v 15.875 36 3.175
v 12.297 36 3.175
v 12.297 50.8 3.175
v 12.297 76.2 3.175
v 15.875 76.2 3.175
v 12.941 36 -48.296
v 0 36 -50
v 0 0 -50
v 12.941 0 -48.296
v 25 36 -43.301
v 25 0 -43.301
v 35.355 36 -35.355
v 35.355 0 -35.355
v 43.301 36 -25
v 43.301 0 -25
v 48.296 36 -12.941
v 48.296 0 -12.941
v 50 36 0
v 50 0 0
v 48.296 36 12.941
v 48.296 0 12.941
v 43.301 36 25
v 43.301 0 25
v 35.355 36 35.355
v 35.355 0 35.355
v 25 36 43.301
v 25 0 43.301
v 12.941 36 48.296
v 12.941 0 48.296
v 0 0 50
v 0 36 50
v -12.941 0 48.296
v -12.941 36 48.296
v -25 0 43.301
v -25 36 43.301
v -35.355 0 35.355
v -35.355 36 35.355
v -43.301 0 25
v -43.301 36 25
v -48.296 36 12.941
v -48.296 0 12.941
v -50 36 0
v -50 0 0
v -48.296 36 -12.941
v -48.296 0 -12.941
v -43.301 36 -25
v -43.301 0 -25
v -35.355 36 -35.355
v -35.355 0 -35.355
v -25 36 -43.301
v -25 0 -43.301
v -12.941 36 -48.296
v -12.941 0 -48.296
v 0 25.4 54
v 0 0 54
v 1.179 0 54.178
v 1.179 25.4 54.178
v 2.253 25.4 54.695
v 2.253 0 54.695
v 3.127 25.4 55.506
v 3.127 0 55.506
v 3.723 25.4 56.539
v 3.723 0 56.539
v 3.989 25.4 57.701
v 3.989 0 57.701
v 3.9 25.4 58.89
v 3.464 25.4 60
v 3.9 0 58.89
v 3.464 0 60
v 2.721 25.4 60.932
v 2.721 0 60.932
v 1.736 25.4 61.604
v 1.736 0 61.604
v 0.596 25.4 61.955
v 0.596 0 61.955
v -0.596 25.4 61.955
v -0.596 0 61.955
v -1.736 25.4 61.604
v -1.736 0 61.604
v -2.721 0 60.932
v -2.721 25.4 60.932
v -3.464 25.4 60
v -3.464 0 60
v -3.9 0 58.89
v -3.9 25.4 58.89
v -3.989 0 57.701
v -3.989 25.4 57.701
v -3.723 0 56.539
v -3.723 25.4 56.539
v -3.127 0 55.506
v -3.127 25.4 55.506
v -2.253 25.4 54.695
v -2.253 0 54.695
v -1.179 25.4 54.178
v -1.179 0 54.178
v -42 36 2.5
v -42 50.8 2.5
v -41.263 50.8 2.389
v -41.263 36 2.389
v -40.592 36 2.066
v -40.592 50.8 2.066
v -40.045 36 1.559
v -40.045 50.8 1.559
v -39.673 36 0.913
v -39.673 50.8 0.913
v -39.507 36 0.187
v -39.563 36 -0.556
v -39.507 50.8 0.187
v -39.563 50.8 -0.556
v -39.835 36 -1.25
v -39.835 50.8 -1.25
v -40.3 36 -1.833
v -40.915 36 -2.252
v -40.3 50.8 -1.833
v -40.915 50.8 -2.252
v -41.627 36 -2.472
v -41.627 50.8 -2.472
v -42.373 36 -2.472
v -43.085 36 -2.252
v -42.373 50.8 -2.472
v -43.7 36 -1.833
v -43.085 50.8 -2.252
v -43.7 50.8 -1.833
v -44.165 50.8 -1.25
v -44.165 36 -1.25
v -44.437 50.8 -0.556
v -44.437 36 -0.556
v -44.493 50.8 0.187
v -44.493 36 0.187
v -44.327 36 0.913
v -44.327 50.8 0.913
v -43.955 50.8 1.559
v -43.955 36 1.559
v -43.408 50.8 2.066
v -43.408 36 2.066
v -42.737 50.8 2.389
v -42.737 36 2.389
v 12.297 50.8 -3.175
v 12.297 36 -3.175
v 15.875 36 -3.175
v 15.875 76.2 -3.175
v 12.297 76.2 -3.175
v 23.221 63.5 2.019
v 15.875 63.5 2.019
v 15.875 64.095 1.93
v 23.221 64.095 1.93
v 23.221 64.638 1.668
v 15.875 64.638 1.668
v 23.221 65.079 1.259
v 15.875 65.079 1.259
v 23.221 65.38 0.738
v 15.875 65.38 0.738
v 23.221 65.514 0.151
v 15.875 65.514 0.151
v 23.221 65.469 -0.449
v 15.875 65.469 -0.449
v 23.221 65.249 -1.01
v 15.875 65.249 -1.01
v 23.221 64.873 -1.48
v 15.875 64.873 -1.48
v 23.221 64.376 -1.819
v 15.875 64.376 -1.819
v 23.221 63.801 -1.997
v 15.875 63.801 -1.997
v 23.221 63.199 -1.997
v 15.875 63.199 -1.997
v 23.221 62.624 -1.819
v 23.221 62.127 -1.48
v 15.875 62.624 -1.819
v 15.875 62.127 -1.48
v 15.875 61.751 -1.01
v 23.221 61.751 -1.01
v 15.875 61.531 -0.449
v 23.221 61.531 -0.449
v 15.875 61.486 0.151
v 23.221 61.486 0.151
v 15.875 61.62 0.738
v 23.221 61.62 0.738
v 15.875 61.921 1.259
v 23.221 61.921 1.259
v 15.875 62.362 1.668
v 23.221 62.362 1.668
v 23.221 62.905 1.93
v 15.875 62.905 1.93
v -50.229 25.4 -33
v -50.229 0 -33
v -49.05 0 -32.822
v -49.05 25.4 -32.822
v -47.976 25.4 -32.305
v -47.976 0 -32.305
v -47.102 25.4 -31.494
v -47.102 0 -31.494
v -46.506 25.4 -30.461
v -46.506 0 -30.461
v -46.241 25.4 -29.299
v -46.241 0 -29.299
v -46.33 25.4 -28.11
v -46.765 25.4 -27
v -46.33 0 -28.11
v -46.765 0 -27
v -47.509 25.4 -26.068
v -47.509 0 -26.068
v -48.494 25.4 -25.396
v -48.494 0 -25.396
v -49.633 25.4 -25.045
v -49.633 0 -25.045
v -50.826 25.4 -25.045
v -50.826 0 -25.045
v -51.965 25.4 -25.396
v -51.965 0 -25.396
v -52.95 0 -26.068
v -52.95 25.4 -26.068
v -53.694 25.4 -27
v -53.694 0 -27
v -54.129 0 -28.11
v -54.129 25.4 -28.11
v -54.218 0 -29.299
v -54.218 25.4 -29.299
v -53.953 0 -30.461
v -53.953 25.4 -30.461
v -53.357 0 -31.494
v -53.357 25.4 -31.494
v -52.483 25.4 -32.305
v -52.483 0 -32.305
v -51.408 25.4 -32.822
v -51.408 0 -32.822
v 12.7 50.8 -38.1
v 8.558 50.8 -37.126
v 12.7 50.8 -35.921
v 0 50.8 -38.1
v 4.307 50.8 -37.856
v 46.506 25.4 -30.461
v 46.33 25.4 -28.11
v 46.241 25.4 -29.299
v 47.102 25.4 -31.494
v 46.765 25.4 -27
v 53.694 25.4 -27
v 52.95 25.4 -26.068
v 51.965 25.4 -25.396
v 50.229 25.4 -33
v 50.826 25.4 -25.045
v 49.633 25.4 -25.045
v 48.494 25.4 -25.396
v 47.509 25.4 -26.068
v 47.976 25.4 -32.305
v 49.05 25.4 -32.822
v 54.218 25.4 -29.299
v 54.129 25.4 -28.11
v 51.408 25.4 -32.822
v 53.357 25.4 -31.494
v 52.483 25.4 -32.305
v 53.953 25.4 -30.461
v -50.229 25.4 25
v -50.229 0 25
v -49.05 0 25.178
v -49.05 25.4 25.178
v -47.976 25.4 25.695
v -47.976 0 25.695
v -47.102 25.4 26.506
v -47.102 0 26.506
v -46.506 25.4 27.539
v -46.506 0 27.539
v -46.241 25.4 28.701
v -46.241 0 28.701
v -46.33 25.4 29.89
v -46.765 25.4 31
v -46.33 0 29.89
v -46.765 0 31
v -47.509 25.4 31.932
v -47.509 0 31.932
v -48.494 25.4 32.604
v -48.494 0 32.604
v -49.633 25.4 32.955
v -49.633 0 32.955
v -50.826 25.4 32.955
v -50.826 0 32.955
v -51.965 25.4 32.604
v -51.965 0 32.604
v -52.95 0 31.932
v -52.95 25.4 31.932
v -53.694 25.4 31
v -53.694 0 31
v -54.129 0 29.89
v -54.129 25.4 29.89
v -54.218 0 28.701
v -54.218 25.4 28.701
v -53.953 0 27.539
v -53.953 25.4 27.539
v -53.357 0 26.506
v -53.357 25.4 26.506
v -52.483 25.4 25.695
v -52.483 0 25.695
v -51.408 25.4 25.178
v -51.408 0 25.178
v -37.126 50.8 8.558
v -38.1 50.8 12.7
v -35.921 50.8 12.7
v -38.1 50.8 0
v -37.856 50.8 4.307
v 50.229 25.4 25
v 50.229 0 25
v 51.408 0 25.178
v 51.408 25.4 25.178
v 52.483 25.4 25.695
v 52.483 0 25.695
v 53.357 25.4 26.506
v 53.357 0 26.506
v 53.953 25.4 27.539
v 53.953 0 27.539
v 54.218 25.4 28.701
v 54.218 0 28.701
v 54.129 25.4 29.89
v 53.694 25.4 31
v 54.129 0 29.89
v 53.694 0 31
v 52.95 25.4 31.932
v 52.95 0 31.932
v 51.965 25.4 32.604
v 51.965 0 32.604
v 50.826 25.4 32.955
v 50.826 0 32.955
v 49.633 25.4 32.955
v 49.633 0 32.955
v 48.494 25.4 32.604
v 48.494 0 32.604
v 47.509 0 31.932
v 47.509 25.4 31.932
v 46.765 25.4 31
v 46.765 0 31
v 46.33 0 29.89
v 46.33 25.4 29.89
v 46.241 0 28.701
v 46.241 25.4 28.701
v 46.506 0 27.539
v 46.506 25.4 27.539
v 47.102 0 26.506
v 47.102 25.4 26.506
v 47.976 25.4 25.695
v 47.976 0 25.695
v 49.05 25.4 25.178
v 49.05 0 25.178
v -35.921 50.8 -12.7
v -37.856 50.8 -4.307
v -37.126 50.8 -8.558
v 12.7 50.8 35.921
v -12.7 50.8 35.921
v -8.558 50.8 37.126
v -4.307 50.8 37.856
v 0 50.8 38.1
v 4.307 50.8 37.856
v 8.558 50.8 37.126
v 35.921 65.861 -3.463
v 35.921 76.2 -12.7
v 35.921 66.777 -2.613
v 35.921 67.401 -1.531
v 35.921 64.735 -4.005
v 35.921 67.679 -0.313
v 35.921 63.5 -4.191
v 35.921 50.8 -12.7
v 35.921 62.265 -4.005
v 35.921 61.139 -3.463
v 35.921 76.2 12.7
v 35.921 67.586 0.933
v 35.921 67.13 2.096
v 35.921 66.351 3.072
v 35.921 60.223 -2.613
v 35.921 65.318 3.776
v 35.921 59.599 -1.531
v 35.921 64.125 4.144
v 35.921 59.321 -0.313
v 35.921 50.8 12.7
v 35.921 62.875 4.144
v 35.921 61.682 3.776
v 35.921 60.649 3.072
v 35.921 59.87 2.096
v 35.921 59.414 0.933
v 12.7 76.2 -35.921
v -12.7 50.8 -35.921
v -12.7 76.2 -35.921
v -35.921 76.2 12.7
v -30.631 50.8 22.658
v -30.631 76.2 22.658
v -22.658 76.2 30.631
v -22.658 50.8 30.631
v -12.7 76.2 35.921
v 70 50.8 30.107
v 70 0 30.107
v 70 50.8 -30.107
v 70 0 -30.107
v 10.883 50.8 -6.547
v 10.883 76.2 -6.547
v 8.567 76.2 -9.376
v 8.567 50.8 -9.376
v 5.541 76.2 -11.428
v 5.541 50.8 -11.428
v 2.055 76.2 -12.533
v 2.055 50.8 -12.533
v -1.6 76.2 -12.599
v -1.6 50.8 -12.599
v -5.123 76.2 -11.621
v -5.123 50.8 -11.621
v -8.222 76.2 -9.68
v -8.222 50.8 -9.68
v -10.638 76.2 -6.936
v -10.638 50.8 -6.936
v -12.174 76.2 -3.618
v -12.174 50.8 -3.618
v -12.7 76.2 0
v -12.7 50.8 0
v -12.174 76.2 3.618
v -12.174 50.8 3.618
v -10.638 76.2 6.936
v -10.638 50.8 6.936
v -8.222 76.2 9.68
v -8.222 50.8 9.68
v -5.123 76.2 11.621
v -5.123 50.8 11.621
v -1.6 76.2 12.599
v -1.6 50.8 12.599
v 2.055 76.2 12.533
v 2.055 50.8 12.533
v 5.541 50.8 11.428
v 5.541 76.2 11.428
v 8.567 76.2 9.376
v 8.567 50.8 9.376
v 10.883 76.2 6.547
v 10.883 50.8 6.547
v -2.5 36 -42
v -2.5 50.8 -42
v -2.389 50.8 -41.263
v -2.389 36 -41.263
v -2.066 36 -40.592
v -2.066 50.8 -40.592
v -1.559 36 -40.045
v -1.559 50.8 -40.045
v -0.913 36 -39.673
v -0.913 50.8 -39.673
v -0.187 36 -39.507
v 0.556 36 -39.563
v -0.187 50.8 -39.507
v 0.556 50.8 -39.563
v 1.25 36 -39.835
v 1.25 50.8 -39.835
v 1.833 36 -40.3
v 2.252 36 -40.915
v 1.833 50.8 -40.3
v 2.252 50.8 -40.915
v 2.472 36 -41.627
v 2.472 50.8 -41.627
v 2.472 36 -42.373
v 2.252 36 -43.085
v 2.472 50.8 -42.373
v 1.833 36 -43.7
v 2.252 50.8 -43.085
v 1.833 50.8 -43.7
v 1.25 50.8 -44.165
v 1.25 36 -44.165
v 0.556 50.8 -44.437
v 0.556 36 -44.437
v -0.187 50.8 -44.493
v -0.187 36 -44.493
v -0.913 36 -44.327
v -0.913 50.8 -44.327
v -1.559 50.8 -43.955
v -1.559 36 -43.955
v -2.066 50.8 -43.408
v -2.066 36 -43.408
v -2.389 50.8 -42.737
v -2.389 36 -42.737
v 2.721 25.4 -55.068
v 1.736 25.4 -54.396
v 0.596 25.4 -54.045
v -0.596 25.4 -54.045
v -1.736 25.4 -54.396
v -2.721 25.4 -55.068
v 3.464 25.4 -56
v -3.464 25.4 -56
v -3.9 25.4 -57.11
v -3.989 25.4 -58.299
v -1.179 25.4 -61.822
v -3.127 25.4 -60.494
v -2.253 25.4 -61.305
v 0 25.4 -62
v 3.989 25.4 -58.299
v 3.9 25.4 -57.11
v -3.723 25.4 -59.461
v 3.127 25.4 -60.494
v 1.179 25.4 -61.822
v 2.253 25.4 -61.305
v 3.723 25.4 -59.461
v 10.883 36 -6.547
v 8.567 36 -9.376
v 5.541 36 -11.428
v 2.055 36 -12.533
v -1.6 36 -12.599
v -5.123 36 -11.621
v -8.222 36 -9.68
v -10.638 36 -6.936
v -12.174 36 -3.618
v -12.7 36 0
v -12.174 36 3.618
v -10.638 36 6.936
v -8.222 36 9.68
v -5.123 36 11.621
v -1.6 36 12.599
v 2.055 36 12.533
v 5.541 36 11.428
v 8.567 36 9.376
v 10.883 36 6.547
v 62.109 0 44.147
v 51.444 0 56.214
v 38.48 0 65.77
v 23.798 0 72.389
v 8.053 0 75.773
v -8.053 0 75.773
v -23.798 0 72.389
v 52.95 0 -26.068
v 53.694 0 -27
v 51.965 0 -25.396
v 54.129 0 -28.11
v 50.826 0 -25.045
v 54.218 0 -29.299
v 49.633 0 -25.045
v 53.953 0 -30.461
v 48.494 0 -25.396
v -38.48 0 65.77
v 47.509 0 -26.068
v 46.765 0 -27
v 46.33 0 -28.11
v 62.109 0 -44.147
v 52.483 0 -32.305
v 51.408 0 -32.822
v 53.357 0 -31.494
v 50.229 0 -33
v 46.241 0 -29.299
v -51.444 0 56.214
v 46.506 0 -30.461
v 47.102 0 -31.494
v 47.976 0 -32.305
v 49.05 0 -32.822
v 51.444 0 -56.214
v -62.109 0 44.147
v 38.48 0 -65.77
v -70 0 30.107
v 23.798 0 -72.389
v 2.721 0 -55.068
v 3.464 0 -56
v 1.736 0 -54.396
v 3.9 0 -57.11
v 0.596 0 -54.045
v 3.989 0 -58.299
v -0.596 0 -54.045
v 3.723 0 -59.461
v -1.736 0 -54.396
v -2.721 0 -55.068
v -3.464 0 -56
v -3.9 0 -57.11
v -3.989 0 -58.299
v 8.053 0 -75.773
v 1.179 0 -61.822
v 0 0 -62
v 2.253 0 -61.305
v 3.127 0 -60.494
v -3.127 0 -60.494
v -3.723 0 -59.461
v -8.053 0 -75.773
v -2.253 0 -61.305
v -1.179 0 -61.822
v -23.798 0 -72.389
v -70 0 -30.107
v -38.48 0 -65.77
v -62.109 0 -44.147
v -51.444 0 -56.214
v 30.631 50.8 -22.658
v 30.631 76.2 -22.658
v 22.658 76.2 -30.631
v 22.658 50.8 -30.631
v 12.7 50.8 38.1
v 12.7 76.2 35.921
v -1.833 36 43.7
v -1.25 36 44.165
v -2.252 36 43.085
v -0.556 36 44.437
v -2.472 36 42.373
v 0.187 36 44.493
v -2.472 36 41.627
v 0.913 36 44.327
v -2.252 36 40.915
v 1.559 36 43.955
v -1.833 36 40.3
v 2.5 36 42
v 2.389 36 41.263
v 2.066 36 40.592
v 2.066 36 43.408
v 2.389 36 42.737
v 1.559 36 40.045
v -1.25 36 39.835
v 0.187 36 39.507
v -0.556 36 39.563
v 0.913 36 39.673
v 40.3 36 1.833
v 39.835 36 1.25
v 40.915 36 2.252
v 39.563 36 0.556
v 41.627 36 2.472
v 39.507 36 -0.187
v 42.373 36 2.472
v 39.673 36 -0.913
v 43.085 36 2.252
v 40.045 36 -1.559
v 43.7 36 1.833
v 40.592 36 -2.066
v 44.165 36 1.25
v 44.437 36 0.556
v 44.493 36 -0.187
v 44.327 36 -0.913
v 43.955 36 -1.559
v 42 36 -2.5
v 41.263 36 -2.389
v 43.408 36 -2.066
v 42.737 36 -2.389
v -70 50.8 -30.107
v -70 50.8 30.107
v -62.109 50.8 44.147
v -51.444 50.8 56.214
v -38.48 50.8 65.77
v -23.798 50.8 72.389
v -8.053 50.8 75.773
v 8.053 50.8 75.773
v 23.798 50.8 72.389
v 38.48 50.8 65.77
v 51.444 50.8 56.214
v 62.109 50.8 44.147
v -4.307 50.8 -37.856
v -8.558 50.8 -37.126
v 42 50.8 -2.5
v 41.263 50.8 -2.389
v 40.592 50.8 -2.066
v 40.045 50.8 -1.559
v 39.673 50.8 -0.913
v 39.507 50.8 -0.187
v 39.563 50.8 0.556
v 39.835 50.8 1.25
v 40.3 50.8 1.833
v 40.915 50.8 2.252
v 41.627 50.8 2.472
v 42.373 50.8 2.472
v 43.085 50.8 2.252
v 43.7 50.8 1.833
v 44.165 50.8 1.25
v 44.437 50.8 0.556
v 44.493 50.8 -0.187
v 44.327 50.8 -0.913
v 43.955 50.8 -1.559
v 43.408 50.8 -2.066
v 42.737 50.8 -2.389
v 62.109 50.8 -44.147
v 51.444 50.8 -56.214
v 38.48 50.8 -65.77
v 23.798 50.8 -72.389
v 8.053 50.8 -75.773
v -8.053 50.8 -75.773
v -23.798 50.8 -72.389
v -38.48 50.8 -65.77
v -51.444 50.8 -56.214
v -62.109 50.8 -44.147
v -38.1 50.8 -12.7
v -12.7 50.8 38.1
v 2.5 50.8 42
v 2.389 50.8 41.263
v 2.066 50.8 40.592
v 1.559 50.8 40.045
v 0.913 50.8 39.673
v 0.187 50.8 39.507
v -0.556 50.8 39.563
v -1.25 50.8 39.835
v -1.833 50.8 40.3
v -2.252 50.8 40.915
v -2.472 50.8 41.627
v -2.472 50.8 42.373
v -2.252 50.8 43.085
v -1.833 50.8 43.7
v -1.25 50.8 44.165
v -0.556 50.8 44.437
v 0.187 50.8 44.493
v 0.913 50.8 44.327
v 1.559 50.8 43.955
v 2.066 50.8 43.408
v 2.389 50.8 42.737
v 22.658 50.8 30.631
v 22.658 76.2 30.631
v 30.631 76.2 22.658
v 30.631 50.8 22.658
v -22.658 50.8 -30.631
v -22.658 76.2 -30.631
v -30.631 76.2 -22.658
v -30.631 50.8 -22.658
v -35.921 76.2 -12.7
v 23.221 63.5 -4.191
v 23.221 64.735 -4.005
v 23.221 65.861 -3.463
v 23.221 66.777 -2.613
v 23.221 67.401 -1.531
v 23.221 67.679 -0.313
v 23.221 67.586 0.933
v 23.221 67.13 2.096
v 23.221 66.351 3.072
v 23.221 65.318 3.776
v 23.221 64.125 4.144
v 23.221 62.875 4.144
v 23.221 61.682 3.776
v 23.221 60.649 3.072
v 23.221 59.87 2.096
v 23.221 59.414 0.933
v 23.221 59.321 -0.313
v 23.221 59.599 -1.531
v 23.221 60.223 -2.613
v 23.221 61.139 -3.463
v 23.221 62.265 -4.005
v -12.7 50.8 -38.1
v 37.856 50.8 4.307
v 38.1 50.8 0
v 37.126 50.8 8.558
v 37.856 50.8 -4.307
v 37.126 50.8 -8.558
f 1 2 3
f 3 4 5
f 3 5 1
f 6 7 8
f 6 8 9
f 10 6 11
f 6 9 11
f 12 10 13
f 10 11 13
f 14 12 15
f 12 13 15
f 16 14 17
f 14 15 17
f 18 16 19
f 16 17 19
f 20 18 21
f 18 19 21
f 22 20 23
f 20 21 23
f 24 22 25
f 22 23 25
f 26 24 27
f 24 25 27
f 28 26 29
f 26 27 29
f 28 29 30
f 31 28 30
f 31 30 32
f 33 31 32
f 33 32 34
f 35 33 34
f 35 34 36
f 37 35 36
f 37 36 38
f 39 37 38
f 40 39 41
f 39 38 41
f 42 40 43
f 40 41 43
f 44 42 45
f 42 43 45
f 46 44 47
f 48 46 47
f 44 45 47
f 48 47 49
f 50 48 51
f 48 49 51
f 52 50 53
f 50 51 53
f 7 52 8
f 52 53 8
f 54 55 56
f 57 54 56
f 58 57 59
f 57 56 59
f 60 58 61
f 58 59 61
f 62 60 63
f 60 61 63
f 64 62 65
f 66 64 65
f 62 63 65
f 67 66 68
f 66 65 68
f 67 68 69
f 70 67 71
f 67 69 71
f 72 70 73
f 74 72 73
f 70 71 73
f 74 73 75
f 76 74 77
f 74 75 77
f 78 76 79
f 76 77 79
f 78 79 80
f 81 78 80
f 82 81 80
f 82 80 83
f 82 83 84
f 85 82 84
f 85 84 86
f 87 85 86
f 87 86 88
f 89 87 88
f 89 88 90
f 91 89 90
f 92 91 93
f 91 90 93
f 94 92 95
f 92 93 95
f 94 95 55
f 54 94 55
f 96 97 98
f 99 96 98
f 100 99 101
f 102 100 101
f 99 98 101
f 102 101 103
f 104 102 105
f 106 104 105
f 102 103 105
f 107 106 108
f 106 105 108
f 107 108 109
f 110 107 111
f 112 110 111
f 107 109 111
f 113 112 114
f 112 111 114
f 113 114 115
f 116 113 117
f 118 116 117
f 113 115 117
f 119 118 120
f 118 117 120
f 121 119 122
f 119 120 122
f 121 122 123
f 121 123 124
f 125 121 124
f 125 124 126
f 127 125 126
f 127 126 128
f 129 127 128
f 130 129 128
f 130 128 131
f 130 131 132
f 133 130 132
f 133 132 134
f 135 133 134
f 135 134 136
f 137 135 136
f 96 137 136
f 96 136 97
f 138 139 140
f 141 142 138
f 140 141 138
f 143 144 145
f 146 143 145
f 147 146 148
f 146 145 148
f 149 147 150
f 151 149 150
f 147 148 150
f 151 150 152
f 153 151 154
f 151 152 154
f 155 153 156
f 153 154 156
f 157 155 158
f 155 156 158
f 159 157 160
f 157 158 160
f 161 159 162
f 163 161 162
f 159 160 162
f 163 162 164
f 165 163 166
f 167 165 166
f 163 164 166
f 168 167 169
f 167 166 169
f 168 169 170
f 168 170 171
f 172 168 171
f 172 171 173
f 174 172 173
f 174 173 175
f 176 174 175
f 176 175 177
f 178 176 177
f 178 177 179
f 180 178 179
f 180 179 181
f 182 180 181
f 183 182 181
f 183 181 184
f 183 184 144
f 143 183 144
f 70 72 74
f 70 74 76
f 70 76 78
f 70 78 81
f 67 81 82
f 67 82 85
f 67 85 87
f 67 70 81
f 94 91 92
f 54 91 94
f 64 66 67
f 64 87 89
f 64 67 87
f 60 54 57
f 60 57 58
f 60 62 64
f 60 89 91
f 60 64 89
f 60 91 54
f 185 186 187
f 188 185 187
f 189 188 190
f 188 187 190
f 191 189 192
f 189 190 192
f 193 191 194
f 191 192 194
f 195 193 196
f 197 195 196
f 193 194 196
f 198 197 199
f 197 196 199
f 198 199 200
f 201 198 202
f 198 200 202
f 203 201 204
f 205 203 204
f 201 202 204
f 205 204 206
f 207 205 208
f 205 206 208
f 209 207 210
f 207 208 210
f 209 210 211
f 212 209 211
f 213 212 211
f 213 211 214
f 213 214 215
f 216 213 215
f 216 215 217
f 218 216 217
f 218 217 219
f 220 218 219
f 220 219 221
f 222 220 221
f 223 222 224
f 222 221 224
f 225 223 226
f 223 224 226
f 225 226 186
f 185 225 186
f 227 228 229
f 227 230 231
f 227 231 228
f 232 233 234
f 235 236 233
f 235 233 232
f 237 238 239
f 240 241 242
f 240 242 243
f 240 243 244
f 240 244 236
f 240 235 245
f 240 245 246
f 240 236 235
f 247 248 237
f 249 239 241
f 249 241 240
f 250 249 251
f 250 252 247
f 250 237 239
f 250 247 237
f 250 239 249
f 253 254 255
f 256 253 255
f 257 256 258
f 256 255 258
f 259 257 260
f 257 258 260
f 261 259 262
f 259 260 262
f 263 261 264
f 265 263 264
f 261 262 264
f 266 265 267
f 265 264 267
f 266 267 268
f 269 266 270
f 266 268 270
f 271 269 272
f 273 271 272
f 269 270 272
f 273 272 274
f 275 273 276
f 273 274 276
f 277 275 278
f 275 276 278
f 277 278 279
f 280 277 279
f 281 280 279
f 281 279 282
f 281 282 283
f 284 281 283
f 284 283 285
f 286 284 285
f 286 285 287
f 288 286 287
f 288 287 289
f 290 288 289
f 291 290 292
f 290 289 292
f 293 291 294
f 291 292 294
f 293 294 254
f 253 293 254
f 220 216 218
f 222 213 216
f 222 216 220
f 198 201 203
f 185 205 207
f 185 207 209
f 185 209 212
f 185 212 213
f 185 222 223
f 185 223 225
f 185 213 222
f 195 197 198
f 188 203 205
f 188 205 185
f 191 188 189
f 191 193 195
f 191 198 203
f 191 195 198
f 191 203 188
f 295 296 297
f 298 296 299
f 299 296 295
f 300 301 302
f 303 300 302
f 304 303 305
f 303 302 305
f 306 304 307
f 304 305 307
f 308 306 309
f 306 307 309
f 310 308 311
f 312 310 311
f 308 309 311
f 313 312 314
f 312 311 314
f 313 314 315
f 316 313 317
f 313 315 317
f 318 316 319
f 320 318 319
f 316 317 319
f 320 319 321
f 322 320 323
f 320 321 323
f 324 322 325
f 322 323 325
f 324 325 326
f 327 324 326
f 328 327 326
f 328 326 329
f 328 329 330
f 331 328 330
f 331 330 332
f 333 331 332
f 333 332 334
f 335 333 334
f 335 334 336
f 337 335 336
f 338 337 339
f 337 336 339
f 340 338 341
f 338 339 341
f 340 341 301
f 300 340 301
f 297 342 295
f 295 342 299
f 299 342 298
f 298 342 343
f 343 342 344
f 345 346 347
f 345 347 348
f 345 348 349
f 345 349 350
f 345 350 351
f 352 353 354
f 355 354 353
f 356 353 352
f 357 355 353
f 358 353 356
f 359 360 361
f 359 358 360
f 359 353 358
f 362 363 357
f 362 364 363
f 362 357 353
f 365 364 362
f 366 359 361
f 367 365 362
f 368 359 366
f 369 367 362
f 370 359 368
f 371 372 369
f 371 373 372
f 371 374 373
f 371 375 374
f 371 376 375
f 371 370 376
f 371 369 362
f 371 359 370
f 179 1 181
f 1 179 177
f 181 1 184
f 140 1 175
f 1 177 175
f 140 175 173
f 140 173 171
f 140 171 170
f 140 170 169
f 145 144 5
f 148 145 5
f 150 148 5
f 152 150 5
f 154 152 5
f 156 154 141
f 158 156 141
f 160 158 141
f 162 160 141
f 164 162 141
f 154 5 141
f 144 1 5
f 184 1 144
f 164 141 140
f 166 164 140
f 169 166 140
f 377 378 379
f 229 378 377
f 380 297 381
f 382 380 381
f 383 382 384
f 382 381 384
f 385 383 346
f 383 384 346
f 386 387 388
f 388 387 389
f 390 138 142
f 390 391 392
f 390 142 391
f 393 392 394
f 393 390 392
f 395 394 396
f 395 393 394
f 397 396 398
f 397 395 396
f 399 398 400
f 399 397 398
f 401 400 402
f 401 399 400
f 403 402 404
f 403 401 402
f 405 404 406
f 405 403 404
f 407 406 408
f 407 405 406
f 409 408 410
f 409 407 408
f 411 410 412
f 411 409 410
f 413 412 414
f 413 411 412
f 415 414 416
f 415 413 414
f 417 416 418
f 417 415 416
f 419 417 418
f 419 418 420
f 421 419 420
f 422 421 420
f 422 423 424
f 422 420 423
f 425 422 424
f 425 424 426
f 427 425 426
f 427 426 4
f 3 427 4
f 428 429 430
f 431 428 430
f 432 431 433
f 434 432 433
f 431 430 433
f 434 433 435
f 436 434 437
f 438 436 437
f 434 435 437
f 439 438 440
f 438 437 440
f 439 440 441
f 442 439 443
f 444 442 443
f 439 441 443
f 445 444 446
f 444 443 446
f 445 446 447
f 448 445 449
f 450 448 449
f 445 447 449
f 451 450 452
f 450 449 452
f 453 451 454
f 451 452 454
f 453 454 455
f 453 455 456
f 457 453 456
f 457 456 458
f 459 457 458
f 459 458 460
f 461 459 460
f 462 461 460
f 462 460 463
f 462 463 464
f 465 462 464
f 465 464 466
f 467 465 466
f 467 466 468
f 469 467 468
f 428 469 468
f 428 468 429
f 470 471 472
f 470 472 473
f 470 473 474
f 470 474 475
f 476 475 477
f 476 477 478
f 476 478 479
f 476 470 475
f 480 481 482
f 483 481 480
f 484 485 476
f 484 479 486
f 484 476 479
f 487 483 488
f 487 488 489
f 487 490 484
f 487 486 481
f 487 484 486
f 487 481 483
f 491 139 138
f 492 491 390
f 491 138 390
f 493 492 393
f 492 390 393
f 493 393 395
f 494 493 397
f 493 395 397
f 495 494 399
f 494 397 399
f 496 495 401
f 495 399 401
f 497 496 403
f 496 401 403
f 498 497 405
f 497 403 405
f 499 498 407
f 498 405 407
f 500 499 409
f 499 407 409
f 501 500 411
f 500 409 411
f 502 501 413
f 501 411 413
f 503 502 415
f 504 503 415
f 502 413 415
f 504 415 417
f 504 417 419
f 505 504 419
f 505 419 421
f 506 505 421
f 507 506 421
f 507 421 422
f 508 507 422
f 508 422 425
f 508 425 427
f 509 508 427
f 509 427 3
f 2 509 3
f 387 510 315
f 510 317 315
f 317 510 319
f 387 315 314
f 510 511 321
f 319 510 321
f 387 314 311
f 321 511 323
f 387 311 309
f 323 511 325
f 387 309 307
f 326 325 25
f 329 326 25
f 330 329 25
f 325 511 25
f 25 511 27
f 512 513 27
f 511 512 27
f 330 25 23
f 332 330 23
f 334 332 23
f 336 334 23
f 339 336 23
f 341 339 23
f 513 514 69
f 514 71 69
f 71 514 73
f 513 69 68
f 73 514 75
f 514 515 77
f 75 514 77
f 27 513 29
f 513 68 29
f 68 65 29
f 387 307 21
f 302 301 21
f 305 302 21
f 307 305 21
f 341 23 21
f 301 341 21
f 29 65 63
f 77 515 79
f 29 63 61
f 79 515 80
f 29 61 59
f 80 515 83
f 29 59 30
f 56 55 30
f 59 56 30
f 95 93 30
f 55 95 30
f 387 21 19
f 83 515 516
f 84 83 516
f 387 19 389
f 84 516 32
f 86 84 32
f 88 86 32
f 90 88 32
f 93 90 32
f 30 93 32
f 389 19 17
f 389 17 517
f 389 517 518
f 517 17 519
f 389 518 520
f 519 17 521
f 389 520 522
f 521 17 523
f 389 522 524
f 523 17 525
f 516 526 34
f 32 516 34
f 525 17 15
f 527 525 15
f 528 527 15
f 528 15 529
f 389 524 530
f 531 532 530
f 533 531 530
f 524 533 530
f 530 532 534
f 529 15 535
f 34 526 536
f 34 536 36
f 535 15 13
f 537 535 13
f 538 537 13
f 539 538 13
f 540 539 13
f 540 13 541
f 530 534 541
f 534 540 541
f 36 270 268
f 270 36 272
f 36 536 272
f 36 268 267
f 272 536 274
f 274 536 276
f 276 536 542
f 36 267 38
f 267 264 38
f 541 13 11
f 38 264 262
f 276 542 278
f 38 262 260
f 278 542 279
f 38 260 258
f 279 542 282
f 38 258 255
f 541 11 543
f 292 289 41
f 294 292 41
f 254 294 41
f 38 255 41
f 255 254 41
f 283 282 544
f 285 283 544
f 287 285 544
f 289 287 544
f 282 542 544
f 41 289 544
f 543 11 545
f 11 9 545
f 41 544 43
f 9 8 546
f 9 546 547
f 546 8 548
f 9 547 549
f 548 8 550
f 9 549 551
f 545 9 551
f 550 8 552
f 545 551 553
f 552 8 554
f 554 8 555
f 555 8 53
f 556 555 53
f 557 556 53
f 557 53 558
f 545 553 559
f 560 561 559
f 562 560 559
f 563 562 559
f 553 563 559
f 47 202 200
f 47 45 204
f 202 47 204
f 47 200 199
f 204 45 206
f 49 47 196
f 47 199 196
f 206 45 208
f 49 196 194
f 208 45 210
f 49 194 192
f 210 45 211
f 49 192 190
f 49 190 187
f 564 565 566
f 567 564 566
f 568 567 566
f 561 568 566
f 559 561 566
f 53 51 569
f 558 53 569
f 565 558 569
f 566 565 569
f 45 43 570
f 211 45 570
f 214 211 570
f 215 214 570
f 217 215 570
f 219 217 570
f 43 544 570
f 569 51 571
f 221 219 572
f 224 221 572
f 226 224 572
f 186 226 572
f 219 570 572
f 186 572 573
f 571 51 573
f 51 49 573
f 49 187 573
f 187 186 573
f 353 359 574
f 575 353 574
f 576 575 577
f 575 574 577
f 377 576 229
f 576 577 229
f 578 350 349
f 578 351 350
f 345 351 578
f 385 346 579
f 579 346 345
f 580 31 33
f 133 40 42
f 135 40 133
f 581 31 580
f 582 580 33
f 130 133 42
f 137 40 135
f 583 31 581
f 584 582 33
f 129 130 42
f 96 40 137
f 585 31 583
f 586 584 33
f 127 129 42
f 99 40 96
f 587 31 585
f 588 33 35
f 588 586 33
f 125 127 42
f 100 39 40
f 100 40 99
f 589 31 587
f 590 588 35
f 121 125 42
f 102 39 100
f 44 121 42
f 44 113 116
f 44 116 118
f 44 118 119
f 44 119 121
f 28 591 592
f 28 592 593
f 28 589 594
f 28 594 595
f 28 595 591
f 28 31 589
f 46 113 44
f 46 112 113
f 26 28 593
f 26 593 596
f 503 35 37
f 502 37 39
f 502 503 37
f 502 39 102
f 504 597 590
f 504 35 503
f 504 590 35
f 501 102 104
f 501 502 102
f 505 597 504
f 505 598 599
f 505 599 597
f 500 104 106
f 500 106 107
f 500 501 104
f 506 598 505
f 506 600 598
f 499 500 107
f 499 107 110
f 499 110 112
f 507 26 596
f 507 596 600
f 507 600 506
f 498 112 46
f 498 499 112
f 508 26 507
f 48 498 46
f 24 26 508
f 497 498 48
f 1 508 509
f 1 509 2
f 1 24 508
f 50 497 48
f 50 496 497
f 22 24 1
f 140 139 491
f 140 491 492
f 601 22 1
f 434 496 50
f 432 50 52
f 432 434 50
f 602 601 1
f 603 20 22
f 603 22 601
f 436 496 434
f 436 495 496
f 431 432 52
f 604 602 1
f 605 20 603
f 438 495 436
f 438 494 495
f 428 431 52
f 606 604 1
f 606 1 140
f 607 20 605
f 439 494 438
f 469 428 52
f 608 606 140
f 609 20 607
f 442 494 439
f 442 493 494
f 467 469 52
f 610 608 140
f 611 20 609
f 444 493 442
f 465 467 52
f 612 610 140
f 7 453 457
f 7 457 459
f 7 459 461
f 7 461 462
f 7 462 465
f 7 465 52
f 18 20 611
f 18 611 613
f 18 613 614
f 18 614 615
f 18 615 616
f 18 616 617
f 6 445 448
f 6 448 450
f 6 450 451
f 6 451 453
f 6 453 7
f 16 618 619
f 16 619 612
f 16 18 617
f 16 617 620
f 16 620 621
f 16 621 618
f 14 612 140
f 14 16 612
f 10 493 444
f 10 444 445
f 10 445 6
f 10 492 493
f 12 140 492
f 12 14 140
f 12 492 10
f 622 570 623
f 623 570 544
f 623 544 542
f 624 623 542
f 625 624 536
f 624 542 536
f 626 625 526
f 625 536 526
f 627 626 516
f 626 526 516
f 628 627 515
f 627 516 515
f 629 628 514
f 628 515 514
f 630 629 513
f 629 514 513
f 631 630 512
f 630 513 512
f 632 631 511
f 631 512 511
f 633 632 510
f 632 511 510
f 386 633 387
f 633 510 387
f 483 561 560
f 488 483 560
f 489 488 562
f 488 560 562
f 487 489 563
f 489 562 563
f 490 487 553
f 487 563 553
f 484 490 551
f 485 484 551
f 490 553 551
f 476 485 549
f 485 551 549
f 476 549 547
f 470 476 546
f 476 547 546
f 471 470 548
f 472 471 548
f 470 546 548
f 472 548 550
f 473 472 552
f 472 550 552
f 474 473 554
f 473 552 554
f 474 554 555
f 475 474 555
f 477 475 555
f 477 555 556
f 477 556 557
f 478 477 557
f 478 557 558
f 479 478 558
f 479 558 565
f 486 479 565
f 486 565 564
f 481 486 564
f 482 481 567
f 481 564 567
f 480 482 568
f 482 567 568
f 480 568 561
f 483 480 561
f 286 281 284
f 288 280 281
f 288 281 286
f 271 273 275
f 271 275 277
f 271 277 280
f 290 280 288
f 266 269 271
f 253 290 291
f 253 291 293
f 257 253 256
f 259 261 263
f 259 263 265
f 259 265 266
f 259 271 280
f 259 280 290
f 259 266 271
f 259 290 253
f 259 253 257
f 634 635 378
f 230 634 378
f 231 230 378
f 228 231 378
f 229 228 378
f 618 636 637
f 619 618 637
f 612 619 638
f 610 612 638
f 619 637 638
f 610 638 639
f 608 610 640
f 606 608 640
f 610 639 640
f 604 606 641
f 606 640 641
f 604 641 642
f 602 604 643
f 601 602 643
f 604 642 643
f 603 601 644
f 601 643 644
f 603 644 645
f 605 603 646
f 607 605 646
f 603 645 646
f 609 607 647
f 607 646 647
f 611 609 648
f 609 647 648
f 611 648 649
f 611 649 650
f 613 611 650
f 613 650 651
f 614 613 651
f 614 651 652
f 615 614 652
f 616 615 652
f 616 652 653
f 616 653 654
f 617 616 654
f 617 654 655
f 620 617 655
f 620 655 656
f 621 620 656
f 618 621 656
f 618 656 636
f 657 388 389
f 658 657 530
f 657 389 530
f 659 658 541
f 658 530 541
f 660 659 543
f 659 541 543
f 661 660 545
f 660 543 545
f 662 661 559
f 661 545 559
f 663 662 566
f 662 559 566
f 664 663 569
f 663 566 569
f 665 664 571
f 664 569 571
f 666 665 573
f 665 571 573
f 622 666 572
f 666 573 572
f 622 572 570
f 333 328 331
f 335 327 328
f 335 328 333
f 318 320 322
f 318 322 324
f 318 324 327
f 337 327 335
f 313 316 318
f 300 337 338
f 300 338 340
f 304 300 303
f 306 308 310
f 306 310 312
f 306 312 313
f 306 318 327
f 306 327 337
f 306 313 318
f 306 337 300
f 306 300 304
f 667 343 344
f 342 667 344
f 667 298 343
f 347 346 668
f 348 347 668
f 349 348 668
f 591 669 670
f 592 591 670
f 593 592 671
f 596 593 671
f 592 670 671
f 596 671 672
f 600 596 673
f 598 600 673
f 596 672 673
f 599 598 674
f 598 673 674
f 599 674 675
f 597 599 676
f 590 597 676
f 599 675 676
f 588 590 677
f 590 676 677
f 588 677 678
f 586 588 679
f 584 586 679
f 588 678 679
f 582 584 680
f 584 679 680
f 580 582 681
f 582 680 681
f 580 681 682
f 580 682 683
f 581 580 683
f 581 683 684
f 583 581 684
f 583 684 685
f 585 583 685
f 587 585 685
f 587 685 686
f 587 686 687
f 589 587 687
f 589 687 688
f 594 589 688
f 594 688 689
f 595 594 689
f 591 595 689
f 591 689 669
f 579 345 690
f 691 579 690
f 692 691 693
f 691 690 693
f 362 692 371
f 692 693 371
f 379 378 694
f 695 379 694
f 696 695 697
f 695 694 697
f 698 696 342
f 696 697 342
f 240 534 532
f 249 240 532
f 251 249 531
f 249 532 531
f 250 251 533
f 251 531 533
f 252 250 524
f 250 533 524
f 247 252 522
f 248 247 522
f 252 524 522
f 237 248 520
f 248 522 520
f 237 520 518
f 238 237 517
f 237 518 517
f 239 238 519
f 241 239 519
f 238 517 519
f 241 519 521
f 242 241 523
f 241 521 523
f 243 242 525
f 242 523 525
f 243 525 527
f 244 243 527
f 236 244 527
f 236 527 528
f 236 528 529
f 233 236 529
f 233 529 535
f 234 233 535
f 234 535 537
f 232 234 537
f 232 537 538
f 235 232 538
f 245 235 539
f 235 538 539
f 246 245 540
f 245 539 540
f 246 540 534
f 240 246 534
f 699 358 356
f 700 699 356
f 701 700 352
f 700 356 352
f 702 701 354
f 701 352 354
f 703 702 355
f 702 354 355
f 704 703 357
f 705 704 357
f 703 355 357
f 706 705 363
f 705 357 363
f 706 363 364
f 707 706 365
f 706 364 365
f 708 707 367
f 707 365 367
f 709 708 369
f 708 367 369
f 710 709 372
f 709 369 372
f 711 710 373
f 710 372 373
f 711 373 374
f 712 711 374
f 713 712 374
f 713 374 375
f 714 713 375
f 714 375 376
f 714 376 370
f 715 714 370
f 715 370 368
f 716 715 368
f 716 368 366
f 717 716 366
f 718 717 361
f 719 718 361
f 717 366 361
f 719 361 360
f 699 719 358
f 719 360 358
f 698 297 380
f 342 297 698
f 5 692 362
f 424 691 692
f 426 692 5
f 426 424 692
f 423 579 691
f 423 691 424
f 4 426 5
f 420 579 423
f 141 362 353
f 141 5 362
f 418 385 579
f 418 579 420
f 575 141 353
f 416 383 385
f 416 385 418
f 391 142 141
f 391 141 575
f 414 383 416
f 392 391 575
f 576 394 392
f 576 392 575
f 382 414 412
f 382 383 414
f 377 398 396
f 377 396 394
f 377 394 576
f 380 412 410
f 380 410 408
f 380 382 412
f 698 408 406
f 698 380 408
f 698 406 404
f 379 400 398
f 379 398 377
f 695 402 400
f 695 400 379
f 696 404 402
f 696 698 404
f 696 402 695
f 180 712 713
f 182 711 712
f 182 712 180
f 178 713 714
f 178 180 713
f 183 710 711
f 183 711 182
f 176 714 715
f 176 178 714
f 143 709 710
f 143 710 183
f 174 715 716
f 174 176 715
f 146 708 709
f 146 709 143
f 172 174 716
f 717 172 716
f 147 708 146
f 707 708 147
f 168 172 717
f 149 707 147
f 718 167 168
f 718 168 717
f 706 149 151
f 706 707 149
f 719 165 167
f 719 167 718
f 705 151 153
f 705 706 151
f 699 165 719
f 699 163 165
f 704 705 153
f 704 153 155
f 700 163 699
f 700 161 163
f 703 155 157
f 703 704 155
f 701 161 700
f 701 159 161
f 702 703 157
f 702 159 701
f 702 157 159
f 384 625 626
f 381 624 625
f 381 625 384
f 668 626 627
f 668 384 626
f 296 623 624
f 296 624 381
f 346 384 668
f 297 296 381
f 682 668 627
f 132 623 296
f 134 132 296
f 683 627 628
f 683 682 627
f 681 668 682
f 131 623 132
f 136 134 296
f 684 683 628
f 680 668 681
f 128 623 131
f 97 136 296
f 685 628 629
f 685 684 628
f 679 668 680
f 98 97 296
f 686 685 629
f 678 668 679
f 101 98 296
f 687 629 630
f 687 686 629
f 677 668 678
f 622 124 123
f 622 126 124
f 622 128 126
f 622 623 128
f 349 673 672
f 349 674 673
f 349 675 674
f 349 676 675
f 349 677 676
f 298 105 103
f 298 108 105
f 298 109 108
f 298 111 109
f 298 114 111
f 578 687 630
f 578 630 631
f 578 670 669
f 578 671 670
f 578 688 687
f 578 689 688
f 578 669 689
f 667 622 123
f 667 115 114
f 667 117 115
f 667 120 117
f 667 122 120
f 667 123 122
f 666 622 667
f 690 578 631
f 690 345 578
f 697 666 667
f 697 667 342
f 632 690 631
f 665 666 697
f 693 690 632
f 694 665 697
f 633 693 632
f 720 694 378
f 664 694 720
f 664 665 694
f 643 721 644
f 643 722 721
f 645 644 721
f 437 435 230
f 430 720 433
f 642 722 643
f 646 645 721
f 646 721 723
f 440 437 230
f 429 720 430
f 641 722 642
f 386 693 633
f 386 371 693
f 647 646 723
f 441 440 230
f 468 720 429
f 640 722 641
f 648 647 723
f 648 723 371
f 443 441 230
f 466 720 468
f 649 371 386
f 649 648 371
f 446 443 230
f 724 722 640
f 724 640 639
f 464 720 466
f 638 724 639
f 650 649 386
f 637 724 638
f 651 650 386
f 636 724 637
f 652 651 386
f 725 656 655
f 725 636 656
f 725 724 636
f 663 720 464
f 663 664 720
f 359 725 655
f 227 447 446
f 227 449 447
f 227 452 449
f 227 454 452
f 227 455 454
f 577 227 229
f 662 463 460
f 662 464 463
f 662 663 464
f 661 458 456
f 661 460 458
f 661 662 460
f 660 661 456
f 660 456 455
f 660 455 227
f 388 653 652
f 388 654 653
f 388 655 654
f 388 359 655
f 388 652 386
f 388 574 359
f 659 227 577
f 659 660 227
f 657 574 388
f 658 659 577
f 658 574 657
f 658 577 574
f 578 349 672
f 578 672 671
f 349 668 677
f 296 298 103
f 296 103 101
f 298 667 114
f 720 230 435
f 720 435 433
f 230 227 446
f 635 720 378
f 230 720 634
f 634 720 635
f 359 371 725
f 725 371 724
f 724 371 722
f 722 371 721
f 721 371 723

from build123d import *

# Parameters (mm, degrees)
SKETCH1_R           = 76.2
BOSS_EXTRUDE1_DEPTH = 76.2
SKETCH2_R           = 50
CUT_EXTRUDE1_DEPTH  = 36
SKETCH3_R           = 4
CUT_EXTRUDE3_DEPTH  = 25.4
CUT_EXTRUDE4_DEPTH  = 132.982271537
CUT_EXTRUDE5_START  = -25.4
SKETCH4_R           = 76.2
SKETCH4_R_2         = 38.1
SKETCH4_R_3         = 12.7
CUT_EXTRUDE5_DEPTH  = 25.4
SKETCH8_W           = 6.35
SKETCH8_H           = 6.35
CUT_EXTRUDE7_DEPTH  = 129.502451338
SKETCH10_R          = 12.7
CUT_EXTRUDE8_DEPTH  = 116.269597032
SKETCH9_R           = 2.0193
CUT_EXTRUDE9_DEPTH  = 138.794759062
CUT_EXTRUDE10_START = -25.4
SKETCH11_W          = 25.4
SKETCH11_H          = 2.178975516
SKETCH11_W_2        = 2.178975516
SKETCH11_H_2        = 25.4
CUT_EXTRUDE10_DEPTH = 25.4
SKETCH14_R          = 2.5
CUT_EXTRUDE13_DEPTH = 129.502451338
SKETCH15_R          = 4.191
CUT_EXTRUDE14_DEPTH = 12.7
CIRPATTERN1_COUNT   = 4


with BuildPart() as part:
    # Sketch1 → Boss-Extrude1 (new body)
    with BuildSketch(Plane(origin=(0, 0, 0), x_dir=(1, 0, 0), z_dir=(0, 1, 0))):
        Circle(SKETCH1_R)
    extrude(amount=BOSS_EXTRUDE1_DEPTH)

    # Sketch2 → Cut-Extrude1 (cut)
    with BuildSketch(Plane.XZ):
        Circle(SKETCH2_R)
    extrude(amount=-CUT_EXTRUDE1_DEPTH, mode=Mode.SUBTRACT)

    # Sketch3 → Cut-Extrude3 (cut)
    with BuildSketch(Plane.XZ):
        with Locations((0, 58)):
            Circle(SKETCH3_R)
        with Locations((50.229473419, 29)):
            Circle(SKETCH3_R)
        with Locations((50.229473419, -29)):
            Circle(SKETCH3_R)
        with Locations((0, -58)):
            Circle(SKETCH3_R)
        with Locations((-50.229473419, -29)):
            Circle(SKETCH3_R)
        with Locations((-50.229473419, 29)):
            Circle(SKETCH3_R)
    extrude(amount=-CUT_EXTRUDE3_DEPTH, mode=Mode.SUBTRACT)

    # Sketch5 → Cut-Extrude4 (cut, through all)
    with BuildSketch(Plane.XZ):
        Polygon((70, 0), (70, -30.10714201), (76.2, -30.10714201), (76.2, 30.10714201), (70, 30.10714201), align=None)
        Polygon((-70, 0), (-70, 30.10714201), (-76.35, 30.10714201), (-76.35, -30.10714201), (-70, -30.10714201), align=None)
    extrude(amount=-CUT_EXTRUDE4_DEPTH, mode=Mode.SUBTRACT)

    # Sketch4 → Cut-Extrude5 (cut)
    # profile 1 of 2: a face of its own
    with BuildSketch(Plane(origin=(0, 76.2, 0), x_dir=(1, 0, 0), z_dir=(0, 1, 0)).offset(CUT_EXTRUDE5_START)):
        Circle(SKETCH4_R)
        Circle(SKETCH4_R_2, mode=Mode.SUBTRACT)
    # profile 2 of 2: a face of its own
    with BuildSketch(Plane(origin=(0, 76.2, 0), x_dir=(1, 0, 0), z_dir=(0, 1, 0)).offset(CUT_EXTRUDE5_START)):
        Circle(SKETCH4_R_3)
    extrude(amount=CUT_EXTRUDE5_DEPTH, mode=Mode.SUBTRACT)

    # Sketch8 → Cut-Extrude7 (cut, through all)
    with BuildSketch(Plane(origin=(0, 76.2, 0), x_dir=(1, 0, 0), z_dir=(0, 1, 0))):
        with Locations((12.7, 0)):
            Rectangle(SKETCH8_W, SKETCH8_H)
    extrude(amount=-CUT_EXTRUDE7_DEPTH, mode=Mode.SUBTRACT)

    # Sketch10 → Cut-Extrude8 (cut, through all)
    with BuildSketch(Plane(origin=(0, 50.8, 0), x_dir=(1, 0, 0), z_dir=(0, 1, 0))):
        Circle(SKETCH10_R)
    extrude(amount=-CUT_EXTRUDE8_DEPTH, mode=Mode.SUBTRACT)

    # Sketch9 → Cut-Extrude9 (cut, through all)
    with BuildSketch(Plane.ZY.offset(-15.875)):
        with Locations((0, 63.5)):
            Circle(SKETCH9_R)
    extrude(amount=-CUT_EXTRUDE9_DEPTH, mode=Mode.SUBTRACT)

    # Sketch11 → Cut-Extrude10 (cut)
    with BuildSketch(Plane(origin=(0, 76.2, 0), x_dir=(1, 0, 0), z_dir=(0, 1, 0)).offset(CUT_EXTRUDE10_START)):
        with BuildLine():
            ThreePointArc((35.921024484, -12.7), (38.1, 0), (35.921024484, 12.7))
            Line((35.921024484, 12.7), (35.921024484, -12.7))
        make_face()
        with Locations((0, -37.010512242)):
            Rectangle(SKETCH11_W, SKETCH11_H)
        with Locations((0, 37.010512242)):
            Rectangle(SKETCH11_W, SKETCH11_H)
        with Locations((-37.010512242, 0)):
            Rectangle(SKETCH11_W_2, SKETCH11_H_2)
    extrude(amount=CUT_EXTRUDE10_DEPTH, mode=Mode.SUBTRACT)

    # Sketch14 → Cut-Extrude13 (cut, through all)
    with BuildSketch(Plane(origin=(0, 76.2, 0), x_dir=(1, 0, 0), z_dir=(0, 1, 0))):
        with Locations((-42, 0)):
            Circle(SKETCH14_R)
    cut_extrude13 = extrude(amount=-CUT_EXTRUDE13_DEPTH, mode=Mode.SUBTRACT)

    # Sketch15 → Cut-Extrude14 (cut)
    with BuildSketch(Plane(origin=(35.921024484, 0, 0), x_dir=(0, 0, -1), z_dir=(1, 0, 0))):
        with Locations((0, 63.5)):
            Circle(SKETCH15_R)
    extrude(amount=-CUT_EXTRUDE14_DEPTH, mode=Mode.SUBTRACT)

    # CirPattern1: Cut-Extrude13 ×4 about axis
    cirpattern1_axis = Axis((0, 76.2, 0), (0, 1, 0))
    for i in range(1, CIRPATTERN1_COUNT):
        add(cut_extrude13.rotate(cirpattern1_axis, i * 360 / CIRPATTERN1_COUNT), mode=Mode.SUBTRACT)


solid = part.part
